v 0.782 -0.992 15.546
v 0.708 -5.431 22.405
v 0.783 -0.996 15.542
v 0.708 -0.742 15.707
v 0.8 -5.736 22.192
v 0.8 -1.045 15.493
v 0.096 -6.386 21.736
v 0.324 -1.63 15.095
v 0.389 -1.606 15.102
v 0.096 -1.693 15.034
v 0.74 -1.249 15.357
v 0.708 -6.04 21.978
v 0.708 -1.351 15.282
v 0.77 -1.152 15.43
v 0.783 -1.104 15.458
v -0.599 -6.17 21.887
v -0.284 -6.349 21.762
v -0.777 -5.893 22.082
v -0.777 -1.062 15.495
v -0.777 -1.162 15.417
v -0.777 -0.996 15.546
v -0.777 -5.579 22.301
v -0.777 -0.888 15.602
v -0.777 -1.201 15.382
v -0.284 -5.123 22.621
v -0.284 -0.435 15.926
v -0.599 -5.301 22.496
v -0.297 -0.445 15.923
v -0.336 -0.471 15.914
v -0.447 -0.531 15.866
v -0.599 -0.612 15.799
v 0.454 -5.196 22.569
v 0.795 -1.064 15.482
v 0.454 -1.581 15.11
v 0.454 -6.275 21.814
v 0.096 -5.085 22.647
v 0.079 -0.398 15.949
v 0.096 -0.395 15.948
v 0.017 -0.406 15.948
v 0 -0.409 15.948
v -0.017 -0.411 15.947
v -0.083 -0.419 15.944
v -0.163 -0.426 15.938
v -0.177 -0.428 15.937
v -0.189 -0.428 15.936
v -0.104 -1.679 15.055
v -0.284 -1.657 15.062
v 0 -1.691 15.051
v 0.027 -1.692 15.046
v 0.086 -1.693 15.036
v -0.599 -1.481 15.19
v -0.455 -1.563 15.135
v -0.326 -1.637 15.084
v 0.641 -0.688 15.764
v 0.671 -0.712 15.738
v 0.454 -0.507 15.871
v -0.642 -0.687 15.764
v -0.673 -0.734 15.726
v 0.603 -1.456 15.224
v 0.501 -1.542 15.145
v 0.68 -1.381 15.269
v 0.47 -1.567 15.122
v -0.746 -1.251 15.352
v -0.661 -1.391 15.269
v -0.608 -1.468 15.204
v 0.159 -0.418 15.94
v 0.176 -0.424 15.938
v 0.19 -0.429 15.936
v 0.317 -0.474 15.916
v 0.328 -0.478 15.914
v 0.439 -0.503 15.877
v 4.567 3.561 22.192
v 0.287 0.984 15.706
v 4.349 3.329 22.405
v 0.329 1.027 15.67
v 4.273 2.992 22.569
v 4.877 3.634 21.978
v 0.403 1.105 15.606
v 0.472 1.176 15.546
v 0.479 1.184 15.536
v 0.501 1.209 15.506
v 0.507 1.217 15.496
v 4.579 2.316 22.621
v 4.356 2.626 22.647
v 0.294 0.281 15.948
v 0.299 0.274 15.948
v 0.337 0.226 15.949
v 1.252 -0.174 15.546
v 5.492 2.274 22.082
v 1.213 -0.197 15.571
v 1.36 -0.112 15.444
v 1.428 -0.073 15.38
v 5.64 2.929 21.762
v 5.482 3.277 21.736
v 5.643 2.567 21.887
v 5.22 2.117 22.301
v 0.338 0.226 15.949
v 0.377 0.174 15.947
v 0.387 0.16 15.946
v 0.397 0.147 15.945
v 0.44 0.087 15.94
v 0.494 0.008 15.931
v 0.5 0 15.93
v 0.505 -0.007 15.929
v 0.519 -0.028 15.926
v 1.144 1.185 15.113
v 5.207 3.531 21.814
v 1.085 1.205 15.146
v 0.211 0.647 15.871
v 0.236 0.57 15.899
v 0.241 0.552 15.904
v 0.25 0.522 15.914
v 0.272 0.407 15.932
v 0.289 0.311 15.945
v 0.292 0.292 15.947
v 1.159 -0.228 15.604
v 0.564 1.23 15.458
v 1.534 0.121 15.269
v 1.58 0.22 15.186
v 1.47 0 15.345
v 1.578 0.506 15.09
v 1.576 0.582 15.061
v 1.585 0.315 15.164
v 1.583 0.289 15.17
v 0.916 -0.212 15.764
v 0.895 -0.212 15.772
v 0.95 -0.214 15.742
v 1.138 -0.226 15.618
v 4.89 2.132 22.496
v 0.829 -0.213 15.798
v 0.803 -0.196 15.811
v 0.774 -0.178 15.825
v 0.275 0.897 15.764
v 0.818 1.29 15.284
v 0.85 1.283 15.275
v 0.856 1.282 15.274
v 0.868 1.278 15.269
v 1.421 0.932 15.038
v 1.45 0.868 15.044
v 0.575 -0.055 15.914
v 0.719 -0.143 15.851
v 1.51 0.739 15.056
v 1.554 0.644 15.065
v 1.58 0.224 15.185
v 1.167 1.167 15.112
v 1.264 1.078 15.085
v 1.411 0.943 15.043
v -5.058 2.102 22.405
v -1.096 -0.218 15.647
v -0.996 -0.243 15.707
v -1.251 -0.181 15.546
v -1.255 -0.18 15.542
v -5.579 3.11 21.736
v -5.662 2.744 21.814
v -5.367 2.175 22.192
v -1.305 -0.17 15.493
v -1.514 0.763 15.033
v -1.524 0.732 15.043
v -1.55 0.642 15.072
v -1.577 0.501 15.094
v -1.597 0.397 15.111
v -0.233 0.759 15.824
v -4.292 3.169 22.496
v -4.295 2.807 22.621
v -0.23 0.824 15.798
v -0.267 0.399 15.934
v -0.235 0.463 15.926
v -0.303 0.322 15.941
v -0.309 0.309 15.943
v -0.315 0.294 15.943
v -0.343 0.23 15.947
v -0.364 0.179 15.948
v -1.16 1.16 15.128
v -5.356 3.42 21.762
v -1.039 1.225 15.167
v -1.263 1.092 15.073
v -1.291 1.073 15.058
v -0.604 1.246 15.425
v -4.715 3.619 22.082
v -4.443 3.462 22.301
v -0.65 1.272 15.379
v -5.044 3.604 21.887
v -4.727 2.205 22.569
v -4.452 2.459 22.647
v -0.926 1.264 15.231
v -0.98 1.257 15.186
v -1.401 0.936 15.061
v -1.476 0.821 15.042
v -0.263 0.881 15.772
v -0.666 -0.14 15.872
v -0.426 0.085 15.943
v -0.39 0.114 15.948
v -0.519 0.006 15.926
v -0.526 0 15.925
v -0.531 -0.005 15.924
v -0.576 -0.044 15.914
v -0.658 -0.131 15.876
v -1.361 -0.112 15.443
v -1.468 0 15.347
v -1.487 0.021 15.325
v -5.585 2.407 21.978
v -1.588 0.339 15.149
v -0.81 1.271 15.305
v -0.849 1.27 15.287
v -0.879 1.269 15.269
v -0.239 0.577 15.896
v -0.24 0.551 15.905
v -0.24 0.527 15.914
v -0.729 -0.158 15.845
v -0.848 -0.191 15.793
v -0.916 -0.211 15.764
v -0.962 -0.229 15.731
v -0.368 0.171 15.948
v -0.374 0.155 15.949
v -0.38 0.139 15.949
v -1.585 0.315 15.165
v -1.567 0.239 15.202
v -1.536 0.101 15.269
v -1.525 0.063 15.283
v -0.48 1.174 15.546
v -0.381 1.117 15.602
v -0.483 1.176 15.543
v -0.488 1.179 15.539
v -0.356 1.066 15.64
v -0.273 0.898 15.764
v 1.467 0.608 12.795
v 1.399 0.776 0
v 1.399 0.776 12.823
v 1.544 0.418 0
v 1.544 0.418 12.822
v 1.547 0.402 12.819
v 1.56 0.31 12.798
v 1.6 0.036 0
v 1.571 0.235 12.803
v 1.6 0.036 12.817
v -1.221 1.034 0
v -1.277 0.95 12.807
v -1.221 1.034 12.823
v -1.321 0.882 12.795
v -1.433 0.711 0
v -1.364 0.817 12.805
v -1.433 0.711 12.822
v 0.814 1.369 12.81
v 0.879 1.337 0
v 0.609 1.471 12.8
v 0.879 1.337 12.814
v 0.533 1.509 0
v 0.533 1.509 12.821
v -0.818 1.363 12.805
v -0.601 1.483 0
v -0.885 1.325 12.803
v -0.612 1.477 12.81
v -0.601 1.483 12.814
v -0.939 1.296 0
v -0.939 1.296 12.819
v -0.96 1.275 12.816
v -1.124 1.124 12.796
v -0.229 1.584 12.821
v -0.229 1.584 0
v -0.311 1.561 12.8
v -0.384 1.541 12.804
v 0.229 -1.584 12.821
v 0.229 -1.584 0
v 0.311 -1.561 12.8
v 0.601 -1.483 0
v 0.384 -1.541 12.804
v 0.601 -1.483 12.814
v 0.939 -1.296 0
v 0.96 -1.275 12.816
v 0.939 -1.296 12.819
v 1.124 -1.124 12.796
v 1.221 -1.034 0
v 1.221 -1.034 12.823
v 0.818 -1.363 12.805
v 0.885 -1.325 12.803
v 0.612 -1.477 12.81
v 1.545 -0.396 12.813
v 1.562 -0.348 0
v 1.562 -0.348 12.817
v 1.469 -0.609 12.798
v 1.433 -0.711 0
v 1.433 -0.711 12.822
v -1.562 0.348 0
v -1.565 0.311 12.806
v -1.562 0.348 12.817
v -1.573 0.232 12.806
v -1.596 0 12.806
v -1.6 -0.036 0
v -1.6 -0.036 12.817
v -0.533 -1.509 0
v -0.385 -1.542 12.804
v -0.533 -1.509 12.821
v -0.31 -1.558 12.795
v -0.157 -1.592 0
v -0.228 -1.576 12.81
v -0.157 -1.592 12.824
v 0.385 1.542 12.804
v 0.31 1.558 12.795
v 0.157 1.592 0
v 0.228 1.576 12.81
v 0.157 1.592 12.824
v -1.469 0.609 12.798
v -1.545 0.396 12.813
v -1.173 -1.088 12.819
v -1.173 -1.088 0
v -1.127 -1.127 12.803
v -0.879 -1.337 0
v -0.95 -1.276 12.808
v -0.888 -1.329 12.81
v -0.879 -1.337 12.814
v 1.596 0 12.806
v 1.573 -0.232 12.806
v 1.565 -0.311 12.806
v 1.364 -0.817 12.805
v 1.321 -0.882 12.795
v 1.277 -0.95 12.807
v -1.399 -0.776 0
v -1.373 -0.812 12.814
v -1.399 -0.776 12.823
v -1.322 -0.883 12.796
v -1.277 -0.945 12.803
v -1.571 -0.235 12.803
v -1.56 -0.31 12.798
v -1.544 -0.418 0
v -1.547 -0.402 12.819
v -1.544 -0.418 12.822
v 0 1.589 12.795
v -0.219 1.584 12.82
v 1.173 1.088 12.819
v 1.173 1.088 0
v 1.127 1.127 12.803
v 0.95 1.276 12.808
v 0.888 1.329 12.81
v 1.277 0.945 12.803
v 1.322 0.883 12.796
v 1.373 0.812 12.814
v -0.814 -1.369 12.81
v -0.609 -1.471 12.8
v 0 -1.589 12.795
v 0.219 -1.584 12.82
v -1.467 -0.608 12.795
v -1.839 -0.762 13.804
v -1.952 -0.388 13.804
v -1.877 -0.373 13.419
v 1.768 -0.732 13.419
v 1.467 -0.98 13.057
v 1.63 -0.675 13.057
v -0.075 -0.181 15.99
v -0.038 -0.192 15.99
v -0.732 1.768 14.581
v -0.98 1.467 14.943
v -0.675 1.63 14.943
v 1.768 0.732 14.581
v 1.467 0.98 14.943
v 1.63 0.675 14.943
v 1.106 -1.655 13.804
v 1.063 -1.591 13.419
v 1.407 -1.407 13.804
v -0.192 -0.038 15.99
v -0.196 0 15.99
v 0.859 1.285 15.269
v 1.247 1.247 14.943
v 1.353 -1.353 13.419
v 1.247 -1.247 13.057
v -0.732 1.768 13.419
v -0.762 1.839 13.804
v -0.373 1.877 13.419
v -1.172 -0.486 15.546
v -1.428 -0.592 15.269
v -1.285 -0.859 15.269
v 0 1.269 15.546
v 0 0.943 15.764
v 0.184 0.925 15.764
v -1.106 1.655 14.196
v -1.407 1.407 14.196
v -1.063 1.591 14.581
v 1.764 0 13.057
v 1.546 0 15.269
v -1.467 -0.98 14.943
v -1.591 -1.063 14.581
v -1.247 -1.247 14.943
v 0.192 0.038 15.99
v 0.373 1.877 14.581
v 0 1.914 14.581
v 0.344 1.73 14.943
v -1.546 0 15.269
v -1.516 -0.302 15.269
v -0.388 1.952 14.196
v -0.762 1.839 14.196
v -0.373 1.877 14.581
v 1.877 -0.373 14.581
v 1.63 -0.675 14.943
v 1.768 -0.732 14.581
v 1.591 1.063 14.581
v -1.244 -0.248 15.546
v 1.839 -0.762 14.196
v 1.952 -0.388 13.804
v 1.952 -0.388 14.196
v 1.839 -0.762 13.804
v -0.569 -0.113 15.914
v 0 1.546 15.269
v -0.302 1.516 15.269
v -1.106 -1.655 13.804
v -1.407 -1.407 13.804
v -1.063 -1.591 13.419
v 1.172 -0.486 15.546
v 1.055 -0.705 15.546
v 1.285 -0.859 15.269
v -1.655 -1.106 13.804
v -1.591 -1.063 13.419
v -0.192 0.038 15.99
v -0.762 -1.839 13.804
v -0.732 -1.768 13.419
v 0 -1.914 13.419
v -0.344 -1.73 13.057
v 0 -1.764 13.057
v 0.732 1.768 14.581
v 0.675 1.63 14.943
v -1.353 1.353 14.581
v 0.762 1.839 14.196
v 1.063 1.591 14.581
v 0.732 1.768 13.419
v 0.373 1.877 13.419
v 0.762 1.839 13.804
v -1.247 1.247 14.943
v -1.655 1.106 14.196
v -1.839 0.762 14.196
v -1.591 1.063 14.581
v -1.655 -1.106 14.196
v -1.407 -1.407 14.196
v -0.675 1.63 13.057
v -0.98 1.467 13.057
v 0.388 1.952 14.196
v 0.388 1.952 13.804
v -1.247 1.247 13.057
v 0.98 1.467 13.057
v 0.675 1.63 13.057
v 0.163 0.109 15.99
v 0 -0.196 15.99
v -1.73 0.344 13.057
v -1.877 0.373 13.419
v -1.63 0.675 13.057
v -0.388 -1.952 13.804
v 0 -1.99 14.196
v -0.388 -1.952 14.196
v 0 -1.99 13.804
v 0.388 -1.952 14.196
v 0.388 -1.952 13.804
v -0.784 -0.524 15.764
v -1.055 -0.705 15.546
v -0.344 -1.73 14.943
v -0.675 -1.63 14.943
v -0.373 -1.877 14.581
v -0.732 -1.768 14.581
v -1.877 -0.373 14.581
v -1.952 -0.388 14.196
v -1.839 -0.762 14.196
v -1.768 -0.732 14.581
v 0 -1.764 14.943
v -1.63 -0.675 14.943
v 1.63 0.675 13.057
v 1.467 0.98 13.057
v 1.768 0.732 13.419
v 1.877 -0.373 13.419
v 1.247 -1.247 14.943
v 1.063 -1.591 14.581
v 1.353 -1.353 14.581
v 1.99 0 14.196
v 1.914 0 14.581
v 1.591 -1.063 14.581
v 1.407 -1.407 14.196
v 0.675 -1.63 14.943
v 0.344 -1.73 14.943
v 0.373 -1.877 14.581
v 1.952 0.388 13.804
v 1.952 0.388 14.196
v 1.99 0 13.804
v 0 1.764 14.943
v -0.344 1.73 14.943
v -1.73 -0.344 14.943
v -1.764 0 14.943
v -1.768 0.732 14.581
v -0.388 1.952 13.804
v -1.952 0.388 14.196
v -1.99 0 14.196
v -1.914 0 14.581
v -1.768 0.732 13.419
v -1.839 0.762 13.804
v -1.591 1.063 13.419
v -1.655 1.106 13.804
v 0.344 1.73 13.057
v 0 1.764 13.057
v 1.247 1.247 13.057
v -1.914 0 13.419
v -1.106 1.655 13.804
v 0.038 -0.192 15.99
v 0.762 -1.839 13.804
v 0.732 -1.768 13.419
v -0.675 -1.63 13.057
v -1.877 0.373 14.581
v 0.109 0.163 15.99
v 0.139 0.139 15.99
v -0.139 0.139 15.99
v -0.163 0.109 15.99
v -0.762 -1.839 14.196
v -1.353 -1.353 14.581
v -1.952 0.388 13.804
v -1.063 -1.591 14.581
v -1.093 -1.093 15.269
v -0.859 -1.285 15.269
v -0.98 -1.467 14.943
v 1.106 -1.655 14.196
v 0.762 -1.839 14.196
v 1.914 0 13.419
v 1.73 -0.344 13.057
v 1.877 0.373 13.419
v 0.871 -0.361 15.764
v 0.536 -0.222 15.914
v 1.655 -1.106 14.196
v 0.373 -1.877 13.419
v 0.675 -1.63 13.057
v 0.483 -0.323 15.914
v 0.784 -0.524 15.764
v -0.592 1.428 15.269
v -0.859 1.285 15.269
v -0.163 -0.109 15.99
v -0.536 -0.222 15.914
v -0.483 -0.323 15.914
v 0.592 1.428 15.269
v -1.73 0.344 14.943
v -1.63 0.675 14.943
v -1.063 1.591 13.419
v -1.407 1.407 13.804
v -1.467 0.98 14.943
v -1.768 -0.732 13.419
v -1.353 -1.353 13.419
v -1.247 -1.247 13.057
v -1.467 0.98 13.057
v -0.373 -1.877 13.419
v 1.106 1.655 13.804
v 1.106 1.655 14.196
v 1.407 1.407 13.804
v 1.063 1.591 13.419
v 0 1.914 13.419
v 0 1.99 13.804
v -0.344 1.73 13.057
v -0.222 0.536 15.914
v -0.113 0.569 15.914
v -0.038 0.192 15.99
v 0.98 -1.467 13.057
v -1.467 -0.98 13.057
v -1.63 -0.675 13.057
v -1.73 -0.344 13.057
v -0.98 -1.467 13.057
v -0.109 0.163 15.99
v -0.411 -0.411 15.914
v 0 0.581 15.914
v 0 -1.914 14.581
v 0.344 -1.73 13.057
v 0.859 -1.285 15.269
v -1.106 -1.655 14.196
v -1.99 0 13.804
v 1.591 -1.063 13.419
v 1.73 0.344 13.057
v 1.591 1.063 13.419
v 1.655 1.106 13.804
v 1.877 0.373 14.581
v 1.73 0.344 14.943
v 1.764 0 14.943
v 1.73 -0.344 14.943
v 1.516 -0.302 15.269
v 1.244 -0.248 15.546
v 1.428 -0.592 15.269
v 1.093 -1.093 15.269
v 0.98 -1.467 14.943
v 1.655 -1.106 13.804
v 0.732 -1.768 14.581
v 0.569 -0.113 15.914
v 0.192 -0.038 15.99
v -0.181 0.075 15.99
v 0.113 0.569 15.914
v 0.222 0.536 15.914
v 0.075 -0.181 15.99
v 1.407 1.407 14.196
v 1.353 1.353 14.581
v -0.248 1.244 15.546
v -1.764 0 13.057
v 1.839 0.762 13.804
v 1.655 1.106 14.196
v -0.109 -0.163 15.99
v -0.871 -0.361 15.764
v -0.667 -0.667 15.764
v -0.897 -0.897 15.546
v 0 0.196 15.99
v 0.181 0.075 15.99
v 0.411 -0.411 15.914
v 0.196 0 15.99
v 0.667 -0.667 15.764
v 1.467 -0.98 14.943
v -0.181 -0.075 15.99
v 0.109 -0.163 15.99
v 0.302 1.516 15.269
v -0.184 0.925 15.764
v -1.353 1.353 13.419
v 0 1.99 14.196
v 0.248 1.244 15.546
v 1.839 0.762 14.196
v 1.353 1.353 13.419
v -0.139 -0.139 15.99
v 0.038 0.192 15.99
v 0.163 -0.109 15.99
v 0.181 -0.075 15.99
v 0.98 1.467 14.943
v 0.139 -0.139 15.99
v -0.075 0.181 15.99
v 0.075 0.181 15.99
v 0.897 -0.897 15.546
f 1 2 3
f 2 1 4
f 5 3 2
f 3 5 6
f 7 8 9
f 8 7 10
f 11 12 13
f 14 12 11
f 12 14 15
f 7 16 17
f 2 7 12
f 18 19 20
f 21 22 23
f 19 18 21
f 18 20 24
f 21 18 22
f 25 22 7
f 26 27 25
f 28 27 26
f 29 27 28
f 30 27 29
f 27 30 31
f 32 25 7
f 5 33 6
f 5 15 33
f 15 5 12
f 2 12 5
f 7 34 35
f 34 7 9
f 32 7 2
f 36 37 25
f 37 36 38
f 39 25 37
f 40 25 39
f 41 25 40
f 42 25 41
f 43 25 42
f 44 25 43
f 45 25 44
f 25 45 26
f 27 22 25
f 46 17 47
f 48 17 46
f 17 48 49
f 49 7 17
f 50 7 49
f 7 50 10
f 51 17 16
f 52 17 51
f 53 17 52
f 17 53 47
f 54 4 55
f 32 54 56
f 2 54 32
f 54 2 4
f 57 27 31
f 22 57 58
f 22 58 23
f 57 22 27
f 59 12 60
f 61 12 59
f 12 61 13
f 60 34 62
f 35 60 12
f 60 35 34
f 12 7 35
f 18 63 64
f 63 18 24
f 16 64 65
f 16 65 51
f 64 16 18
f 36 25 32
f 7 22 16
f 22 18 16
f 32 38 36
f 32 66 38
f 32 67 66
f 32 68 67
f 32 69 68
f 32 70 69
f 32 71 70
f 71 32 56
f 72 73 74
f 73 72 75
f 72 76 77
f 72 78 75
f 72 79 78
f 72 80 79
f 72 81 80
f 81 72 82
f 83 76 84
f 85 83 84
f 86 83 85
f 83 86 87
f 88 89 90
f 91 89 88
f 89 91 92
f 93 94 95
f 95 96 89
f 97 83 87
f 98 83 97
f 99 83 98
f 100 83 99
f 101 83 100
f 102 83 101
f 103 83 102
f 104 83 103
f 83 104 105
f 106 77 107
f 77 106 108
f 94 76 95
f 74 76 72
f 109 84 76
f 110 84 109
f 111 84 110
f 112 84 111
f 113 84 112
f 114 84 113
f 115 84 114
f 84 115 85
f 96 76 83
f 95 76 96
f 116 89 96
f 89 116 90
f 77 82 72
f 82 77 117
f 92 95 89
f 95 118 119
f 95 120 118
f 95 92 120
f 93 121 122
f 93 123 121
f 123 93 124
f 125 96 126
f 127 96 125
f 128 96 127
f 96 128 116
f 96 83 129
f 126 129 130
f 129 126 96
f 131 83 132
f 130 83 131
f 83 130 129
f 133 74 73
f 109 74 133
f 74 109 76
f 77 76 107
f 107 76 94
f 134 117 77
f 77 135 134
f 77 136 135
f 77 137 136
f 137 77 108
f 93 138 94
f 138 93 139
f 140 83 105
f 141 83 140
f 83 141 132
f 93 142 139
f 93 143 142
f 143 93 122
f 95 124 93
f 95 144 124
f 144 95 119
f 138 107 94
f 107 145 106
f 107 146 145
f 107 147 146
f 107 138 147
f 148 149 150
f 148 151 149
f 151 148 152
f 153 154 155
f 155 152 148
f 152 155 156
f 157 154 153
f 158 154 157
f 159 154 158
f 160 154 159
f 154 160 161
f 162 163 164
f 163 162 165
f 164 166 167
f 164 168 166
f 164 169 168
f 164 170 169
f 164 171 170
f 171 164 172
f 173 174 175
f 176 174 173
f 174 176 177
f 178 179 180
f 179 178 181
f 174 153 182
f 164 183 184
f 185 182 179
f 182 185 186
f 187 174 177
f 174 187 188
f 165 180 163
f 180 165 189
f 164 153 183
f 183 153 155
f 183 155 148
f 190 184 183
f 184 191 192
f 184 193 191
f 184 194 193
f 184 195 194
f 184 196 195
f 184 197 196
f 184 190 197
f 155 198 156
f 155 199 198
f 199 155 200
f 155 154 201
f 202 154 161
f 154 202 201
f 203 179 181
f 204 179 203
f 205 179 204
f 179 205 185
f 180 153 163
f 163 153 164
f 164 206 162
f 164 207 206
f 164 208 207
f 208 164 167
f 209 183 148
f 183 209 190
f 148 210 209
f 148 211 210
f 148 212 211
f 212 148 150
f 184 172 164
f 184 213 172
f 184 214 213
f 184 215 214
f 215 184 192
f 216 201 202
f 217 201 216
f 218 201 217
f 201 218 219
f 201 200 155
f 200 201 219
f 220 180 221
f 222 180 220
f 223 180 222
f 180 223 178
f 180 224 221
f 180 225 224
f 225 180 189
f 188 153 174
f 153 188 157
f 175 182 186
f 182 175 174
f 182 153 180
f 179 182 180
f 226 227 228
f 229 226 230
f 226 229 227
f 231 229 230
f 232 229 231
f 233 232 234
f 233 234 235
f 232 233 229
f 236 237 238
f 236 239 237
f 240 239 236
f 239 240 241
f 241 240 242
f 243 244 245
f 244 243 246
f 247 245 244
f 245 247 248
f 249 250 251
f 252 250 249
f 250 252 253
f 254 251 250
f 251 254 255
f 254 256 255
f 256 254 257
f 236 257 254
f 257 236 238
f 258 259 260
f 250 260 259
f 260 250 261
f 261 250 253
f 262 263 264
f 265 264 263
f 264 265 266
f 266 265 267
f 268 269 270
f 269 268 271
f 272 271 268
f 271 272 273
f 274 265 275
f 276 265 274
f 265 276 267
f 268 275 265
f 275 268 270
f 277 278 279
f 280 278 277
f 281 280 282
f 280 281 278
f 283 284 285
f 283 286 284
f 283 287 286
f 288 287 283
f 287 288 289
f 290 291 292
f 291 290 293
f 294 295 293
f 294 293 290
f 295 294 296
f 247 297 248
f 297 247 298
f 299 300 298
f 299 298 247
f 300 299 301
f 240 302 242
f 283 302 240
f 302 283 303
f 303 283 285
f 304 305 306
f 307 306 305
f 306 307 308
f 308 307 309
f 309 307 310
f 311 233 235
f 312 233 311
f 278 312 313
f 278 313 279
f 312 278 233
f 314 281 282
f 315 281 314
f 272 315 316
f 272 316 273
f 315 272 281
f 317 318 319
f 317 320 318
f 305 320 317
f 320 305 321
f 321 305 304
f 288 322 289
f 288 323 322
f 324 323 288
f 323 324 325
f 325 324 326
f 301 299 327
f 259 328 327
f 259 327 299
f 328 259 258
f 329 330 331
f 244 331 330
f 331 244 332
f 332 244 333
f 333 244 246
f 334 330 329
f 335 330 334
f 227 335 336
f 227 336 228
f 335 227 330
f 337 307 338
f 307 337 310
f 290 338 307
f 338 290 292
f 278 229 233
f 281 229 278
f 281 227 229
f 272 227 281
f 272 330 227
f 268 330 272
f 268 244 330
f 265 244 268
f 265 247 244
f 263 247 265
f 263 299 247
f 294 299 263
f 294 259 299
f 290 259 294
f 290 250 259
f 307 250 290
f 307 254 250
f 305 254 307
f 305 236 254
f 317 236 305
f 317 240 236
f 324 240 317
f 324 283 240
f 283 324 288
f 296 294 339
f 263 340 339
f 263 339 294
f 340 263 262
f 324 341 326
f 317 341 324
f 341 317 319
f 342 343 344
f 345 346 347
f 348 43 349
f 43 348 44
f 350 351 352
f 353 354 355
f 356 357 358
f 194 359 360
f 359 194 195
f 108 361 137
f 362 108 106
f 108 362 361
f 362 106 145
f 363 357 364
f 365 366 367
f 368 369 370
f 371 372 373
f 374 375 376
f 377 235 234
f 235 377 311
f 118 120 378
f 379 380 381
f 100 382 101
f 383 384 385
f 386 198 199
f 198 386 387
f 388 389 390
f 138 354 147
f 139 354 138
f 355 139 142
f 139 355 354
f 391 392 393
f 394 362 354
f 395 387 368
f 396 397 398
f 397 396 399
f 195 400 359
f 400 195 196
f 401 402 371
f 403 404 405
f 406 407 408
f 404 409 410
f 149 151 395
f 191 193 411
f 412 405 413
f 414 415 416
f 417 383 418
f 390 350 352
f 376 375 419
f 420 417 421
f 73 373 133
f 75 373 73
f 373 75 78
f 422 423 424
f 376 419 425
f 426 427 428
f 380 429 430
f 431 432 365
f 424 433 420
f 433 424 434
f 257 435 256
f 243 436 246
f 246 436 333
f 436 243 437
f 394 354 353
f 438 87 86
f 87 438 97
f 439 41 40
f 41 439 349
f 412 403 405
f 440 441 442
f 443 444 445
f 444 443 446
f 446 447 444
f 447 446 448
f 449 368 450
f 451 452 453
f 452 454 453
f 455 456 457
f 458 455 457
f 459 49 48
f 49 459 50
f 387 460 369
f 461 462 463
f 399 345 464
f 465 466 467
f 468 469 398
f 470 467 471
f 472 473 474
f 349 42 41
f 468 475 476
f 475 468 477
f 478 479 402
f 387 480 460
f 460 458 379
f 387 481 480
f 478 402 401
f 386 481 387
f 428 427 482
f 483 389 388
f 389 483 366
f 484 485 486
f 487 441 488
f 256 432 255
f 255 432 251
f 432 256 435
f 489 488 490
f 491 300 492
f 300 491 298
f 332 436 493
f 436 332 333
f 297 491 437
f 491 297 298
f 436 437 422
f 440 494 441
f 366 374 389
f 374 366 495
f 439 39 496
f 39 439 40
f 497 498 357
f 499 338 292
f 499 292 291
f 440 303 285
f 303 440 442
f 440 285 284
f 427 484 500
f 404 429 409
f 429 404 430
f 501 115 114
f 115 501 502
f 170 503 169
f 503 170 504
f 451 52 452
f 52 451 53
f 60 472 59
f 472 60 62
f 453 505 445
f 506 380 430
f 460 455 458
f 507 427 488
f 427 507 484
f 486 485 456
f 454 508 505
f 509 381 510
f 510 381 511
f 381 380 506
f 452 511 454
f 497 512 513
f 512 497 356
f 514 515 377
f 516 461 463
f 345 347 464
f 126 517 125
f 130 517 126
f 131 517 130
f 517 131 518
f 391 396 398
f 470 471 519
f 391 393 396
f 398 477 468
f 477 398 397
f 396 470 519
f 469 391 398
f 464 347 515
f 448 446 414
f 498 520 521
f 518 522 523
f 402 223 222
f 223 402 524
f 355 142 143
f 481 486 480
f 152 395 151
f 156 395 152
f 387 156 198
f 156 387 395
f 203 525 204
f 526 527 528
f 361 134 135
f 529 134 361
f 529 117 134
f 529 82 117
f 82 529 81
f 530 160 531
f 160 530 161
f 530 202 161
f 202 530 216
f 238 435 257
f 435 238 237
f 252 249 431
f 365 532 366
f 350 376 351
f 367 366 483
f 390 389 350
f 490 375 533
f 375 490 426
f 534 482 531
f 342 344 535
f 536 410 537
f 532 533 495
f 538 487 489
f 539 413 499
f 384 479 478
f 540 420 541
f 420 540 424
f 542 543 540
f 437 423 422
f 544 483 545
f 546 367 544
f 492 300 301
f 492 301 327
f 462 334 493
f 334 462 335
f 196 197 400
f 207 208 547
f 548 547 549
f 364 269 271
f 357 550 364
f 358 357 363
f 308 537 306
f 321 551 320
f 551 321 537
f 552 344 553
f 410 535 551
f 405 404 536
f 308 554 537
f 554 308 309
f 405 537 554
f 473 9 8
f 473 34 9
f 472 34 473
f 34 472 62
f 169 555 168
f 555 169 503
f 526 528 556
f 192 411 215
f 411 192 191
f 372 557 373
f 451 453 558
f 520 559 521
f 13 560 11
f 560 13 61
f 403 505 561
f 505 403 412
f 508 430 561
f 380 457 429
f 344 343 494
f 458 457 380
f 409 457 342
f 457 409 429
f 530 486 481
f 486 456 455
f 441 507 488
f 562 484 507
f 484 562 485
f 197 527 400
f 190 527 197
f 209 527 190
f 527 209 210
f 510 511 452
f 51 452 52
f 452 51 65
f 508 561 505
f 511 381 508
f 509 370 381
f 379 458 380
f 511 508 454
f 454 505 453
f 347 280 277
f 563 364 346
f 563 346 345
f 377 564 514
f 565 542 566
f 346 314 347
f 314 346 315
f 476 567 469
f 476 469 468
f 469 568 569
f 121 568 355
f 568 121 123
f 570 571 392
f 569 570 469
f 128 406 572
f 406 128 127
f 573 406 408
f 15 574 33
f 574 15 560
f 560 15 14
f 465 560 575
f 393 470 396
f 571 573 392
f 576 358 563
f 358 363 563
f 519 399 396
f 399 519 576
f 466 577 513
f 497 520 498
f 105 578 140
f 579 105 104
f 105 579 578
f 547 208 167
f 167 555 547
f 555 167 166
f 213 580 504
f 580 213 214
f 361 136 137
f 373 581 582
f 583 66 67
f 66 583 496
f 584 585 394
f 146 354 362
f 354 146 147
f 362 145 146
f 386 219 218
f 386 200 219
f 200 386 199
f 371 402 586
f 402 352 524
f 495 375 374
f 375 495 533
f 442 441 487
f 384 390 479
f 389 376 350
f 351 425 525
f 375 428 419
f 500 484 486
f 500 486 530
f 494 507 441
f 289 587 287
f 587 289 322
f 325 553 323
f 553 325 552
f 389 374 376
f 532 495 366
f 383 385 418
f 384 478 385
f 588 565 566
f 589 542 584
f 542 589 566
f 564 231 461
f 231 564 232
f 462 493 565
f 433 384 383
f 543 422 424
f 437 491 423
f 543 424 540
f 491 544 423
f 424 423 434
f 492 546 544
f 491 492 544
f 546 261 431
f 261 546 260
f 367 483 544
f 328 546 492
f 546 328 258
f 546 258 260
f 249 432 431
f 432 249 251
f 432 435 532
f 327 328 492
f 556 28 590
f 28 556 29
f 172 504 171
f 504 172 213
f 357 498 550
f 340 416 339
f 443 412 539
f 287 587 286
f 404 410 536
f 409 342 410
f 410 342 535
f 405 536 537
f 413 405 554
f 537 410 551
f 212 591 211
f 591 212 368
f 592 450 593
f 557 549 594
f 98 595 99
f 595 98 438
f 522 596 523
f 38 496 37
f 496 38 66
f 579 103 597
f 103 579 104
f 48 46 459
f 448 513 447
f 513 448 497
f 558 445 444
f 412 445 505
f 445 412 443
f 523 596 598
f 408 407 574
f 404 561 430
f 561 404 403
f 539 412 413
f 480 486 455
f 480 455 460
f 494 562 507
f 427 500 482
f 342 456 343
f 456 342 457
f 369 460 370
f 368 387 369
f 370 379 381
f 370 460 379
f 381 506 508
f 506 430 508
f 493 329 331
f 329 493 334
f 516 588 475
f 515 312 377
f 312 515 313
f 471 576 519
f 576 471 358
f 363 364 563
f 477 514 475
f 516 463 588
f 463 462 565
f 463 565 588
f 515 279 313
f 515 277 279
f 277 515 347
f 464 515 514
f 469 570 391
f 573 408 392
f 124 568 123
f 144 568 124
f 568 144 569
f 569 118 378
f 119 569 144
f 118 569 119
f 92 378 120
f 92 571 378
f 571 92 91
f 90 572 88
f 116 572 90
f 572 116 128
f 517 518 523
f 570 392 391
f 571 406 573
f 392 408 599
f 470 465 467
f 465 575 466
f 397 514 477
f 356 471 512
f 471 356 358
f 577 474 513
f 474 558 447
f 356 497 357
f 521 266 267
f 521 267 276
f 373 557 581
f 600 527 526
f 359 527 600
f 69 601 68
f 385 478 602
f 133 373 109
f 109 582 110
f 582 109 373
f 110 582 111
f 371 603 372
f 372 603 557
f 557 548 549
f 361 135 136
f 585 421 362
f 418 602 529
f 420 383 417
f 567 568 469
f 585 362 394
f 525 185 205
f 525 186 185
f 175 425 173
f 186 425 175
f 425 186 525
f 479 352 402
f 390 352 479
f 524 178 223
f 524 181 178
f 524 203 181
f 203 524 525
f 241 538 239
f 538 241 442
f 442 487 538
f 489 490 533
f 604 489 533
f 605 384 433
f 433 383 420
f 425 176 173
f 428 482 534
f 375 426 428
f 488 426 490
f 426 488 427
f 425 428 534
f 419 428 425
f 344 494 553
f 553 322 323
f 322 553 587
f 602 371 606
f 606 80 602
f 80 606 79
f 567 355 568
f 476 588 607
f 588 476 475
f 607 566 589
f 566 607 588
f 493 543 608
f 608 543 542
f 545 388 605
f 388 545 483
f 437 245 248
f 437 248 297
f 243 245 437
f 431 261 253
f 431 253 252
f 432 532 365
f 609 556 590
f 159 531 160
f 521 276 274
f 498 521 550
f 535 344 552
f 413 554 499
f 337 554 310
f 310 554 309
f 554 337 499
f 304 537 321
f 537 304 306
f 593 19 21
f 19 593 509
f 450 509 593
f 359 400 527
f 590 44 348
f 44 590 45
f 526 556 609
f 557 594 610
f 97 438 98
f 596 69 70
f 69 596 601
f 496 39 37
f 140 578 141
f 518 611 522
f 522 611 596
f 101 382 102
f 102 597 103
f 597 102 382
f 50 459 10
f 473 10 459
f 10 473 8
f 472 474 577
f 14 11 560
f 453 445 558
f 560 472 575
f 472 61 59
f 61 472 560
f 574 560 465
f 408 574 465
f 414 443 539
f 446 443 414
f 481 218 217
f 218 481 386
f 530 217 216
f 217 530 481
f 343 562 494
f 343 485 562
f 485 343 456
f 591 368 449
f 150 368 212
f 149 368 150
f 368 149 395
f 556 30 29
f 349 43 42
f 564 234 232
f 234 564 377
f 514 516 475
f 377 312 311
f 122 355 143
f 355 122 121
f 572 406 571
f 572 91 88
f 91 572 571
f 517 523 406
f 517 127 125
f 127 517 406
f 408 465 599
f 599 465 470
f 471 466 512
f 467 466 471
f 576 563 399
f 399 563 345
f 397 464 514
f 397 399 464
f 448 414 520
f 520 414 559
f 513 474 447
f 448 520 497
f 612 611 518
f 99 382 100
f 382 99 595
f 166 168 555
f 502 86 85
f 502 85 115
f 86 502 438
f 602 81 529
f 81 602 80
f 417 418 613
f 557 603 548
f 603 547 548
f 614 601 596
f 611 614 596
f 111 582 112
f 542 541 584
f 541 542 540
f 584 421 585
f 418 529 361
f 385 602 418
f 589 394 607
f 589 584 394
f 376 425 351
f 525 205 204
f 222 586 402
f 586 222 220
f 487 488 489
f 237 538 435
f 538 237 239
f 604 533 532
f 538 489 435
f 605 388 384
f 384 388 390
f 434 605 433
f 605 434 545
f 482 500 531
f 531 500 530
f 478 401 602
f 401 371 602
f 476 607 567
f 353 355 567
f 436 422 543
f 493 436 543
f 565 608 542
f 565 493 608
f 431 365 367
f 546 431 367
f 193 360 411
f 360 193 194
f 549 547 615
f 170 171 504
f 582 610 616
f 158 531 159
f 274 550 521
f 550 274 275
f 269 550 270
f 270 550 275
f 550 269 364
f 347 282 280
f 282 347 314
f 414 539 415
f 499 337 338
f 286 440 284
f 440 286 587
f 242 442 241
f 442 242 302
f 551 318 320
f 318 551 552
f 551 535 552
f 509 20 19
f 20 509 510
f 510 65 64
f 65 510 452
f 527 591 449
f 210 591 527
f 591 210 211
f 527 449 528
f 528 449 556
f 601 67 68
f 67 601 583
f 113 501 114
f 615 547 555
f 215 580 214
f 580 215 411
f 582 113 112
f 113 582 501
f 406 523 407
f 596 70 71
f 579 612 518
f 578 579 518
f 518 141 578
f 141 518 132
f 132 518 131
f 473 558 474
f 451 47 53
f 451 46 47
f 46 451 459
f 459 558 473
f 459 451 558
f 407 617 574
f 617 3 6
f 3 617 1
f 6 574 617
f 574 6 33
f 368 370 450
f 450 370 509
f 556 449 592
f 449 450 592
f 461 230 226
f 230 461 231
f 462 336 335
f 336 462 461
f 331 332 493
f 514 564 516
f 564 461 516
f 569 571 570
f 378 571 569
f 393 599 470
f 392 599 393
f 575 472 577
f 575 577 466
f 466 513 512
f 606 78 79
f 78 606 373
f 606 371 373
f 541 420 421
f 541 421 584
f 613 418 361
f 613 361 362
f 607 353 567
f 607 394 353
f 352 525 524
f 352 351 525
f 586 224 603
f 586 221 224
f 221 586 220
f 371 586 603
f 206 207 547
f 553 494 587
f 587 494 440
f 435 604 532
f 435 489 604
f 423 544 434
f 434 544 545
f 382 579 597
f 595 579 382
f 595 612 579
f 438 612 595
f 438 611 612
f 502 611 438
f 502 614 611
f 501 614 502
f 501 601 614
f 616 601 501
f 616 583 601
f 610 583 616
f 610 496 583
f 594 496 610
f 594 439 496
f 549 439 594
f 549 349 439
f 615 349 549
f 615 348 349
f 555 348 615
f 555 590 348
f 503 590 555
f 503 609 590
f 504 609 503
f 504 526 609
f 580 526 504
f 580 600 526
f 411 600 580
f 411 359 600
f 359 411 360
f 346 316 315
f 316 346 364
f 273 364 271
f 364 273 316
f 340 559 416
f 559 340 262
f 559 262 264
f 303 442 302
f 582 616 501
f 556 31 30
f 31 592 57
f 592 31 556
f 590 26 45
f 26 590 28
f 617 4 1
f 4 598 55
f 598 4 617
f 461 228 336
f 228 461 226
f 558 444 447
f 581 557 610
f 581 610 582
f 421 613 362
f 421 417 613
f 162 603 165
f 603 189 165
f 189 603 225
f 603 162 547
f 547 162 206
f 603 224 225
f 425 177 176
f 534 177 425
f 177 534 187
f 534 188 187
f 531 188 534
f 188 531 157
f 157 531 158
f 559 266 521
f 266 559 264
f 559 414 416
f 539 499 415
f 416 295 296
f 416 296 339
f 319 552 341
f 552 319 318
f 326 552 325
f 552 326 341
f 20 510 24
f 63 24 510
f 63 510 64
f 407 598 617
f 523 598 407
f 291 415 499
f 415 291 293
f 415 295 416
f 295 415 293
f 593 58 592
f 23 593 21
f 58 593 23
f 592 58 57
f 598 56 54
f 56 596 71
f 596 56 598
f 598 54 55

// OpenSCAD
$fa = 2;
$fs = 0.4;

module antenna() {
  color("#d0d0d4")
    union() {
      // Offset the mast facets from the ball's so their seam has no coincident vertices.
      rotate([0, 0, 1.3]) cylinder(h = 14, d = 3.2);
      // Whiskers start at the ball centre so they only meet inside the ball.
      translate([0, 0, 14])
        for (a = [0, 120, 240])
          rotate([0, 0, a])
            rotate([35, 0, 0])
              cylinder(h = 10, d = 1.6);
      translate([0, 0, 14])
        sphere(d = 4);
    }
}

antenna();
